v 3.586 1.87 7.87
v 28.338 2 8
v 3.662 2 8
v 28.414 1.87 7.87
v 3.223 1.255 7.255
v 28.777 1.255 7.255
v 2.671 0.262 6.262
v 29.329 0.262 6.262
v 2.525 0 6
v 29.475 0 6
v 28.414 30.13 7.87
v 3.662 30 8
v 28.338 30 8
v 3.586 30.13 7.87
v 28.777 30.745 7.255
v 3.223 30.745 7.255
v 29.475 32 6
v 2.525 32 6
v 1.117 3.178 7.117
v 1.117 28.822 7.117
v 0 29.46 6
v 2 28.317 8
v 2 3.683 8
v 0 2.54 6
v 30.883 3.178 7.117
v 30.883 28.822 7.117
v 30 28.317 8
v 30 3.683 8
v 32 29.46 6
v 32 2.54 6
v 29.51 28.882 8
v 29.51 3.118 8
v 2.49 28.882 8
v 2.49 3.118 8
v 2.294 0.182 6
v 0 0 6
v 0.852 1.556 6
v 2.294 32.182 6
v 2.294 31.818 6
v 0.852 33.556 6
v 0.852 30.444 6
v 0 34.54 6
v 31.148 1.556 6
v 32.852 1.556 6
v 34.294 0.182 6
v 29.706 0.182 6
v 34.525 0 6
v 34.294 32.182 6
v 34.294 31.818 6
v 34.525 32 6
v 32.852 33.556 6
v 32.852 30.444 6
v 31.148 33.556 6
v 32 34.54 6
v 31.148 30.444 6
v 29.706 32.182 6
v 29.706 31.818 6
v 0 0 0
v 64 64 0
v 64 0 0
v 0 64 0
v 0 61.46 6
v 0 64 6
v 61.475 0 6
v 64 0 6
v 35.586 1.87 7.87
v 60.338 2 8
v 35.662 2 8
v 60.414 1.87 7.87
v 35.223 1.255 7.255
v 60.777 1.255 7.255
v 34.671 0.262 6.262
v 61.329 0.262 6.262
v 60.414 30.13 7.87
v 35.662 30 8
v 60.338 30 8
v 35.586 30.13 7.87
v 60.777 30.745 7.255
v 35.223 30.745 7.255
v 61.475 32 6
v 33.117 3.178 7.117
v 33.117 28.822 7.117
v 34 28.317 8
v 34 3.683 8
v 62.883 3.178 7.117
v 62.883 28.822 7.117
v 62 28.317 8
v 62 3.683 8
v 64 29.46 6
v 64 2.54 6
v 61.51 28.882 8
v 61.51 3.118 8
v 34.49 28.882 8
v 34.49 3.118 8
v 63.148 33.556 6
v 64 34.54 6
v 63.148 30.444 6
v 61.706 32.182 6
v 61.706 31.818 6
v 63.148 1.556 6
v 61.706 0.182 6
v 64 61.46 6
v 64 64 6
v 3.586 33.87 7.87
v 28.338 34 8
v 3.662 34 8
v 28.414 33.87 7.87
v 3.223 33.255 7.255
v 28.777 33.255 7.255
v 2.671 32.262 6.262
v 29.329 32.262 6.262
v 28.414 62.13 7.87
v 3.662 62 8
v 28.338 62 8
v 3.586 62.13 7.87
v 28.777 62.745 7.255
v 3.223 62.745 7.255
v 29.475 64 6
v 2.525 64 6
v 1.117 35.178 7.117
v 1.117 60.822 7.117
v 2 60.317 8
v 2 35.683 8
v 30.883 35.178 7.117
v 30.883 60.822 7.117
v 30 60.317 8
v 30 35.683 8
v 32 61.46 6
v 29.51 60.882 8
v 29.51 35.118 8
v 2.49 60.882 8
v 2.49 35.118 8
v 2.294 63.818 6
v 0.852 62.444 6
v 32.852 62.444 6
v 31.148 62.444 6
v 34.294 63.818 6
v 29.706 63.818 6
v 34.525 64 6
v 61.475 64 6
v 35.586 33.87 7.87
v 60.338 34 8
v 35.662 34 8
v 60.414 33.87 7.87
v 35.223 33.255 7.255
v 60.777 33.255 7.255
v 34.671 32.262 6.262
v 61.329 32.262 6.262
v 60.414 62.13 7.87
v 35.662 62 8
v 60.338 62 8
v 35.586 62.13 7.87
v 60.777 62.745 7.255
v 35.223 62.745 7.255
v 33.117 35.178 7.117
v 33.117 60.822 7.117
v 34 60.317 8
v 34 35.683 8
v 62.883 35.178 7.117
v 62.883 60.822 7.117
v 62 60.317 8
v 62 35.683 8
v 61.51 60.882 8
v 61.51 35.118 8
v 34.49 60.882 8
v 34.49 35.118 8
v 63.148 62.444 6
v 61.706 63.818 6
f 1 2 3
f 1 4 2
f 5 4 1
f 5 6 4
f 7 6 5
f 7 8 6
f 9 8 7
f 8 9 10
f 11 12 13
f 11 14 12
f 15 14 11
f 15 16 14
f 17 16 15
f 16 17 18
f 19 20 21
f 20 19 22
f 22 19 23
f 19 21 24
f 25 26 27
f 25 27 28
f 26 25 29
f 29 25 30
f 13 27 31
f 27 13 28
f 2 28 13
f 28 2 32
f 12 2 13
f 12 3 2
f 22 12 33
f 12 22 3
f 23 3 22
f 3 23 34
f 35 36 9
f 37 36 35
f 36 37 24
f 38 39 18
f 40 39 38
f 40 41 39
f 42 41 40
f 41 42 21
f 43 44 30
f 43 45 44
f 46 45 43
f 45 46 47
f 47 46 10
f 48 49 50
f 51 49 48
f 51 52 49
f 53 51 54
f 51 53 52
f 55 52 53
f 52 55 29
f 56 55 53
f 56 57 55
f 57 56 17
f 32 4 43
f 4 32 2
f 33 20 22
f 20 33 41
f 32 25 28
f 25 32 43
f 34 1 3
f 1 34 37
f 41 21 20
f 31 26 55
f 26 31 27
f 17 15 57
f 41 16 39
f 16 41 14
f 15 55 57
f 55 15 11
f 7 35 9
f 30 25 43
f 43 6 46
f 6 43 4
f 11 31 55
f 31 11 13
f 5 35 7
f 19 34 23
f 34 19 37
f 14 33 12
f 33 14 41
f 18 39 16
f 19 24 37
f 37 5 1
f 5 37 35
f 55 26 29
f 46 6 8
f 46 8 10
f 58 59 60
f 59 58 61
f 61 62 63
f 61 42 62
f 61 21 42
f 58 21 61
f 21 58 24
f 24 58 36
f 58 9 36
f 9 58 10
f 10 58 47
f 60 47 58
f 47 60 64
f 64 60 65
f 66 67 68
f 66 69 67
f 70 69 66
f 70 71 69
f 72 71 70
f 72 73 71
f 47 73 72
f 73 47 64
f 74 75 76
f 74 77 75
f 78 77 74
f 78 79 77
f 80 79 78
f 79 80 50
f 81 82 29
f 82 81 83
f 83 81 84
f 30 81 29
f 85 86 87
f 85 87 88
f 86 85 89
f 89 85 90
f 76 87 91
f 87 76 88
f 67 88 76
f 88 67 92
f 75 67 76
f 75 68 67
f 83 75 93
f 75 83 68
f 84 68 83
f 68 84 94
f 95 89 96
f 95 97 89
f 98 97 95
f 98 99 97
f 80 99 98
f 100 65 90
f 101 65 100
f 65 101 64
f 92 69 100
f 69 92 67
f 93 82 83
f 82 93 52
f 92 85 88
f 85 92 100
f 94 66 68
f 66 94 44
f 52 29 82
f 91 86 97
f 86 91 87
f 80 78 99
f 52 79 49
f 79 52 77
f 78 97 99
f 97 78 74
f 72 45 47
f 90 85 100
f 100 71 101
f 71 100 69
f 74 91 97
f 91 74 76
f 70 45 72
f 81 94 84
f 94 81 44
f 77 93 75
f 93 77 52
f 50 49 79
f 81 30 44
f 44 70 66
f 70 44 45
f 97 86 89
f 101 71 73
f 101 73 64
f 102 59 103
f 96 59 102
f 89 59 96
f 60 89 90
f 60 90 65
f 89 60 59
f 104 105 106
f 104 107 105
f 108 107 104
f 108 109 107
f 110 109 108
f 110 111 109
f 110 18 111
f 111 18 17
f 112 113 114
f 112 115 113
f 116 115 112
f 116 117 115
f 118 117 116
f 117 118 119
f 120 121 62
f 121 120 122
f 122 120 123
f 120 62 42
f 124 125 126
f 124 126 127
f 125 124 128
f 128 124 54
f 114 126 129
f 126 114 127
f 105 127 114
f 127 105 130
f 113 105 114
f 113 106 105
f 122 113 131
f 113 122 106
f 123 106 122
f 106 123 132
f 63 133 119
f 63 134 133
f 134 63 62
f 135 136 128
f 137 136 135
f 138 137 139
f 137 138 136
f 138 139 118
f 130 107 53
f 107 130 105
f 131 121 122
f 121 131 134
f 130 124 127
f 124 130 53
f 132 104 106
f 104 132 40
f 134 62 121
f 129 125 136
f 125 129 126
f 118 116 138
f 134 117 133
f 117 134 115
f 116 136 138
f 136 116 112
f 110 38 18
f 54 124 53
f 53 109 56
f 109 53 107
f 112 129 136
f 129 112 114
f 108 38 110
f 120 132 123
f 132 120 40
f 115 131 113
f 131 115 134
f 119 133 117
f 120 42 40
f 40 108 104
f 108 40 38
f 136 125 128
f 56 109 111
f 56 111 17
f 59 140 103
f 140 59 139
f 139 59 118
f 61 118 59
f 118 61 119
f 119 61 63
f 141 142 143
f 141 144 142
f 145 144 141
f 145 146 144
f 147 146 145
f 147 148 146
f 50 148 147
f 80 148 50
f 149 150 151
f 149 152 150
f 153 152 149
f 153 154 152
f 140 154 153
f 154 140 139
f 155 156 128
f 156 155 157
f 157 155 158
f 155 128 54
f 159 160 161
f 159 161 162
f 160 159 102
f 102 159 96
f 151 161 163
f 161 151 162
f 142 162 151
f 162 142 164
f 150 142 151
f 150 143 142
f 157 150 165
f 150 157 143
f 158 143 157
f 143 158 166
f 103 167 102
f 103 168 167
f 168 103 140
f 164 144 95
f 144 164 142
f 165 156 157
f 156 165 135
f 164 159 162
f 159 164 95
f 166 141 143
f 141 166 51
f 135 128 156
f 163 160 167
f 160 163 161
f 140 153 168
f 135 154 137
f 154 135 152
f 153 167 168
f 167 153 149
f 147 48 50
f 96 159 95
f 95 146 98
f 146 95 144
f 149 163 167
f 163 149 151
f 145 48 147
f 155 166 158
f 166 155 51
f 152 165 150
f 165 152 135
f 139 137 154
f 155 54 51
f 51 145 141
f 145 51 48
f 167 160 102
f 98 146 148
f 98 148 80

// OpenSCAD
// file: WylochStyleDungeonLibrary.scad
size = 32;
baseheight = 6;
topperheight = 2;
topperrounded = true;
walllength = size;
wallheight = 25 + baseheight + topperheight;
wallwidth = 6;
wallwidththin = 4;

function hypotenuse_ra(side_a, side_b) =
    sqrt(pow(side_a, 2) + pow(side_b, 2));
    
module wsdl_Base(s,bh)
{
    cube([s,s,bh]);
}

module wsdl_Topper(s,bh,th,tr)
{
    if (tr) {
        translate([0,0,bh])
            intersection() {
                difference () {
                        cube([s,s,th]);
                        union () {
                        rotate(a=45, v=[1,0,0])
                            cube([s,th*2,th*2]);
                        translate([0,s,0])
                            rotate(a=45, v=[1,0,0])
                                cube([s,th*2,th*2]);
                        rotate(a=-45, v=[0,1,0])
                            cube([th*2,s,th*2]);
                        translate([s,0,0])
                            rotate(a=-45, v=[0,1,0])
                                cube([th*2,s,th*2]);
                        }
                }
                translate([s/2,s/2,0])
                    cylinder(
                        h=th, 
                        r1=hypotenuse_ra(s/2-1.2, s/2-1.2), 
                        r2=hypotenuse_ra(s/2-th-.8, s/2-th-.8), 
                        center=false, 
                        $fa=.1);
            }    
    }
    else {
        translate([0,0,bh])
            difference() {
                cube([s,s,th]);
                union () {
                rotate(a=45, v=[1,0,0])
                    cube([s,th*2,th*2]);
                translate([0,s,0])
                    rotate(a=45, v=[1,0,0])
                        cube([s,th*2,th*2]);
                rotate(a=-45, v=[0,1,0])
                    cube([th*2,s,th*2]);
                translate([s,0,0])
                    rotate(a=-45, v=[0,1,0])
                        cube([th*2,s,th*2]);
                }
            }    
    }
}

module wsdl_Base_1x1(s,bh,th,tr) 
{
    union () {
        wsdl_Base(s,bh);
        wsdl_Topper(s,bh,th,tr);
    }
}

module wsdl_Base_1x2(s,bh,th,tr)
{
    union () {
        wsdl_Base_1x1(s,bh,th,tr);
        translate([s,0,0])
            wsdl_Base_1x1(s,bh,th,tr);
    }
}
 
module wsdl_Base_2x2(s,bh,th,tr)
{
    union () {
        wsdl_Base_1x2(s,bh,th,tr);
        translate([0,s,0])
            wsdl_Base_1x2(s,bh,th,tr);
    }
}
 
module wsdl_Base_2x4(s,bh,th,tr)
{
    union () {
        wsdl_Base_2x2(s,bh,th,tr);
        translate([s*2,0,0])
            wsdl_Base_2x2(s,bh,th,tr);
    }
}
 
module wsdl_Base_4x4(s,bh,th,tr)
{
    union () {
        wsdl_Base_2x4(s,bh,th,tr);
        translate([0,s*2,0])
            wsdl_Base_2x4(s,bh,th,tr);
    }
}
 
module wsdl_Wall_1(w,l,h)
{
    cube([w,l,h]);   
}

module wsdl_Wall_2(w,l,h)
{
    union() {
        wsdl_Wall_1(w,l,h);
        translate([0,l,0])
            wsdl_Wall_1(w,l,h);
    }
}

module wsdl_Wall_1_Left(w,l,h) 
{
    wsdl_Wall_1(w,l,h);
}

module wsdl_Wall_1_Right(w,l,h) 
{
    translate([(size)-w,0,0])
        wsdl_Wall_1(w,l,h);
}

module wsdl_Wall_1_DoubleRight(w,l,h) 
{
    translate([(size*2)-w,0,0])
        wsdl_Wall_1(w,l,h);
}

module wsdl_Wall_1_Bottom(w,l,h) 
{
rotate(a=-90)
    translate([-w,0,0])
        wsdl_Wall_1(w,l,h);

}

module wsdl_Wall_1_Top(w,l,h) 
{
rotate(a=-90)
    translate([-l,0,0])
        wsdl_Wall_1(w,l,h);

}

module wsdl_Wall_1_Center(w,l,h) 
{
    translate([(size)-w/2,0,0])
        wsdl_Wall_1(w,l,h);
}


module wsdl_Wall_2_Left(w,l,h) 
{
    wsdl_Wall_2(w,l,h);
}

module wsdl_Wall_2_Right(w,l,h) 
{
    translate([(size*2)-w,0,0])
        wsdl_Wall_2(w,l,h);
}

module wsdl_Wall_2_Bottom(w,l,h) 
{
rotate(a=-90)
    translate([-w,0,0])
        wsdl_Wall_2(w,l,h);

}

module wsdl_Wall_2_Top(w,l,h) 
{
rotate(a=-90)
    translate([-l*2,0,0])
        wsdl_Wall_2(w,l,h);

}

module wsdl_Wall_2_Center(w,l,h) 
{
    translate([(size)-w/2,0,0])
        wsdl_Wall_2(w,l,h);
}
// main file
include <WylochStyleDungeonLibrary.scad>; 

wsdl_Base_2x2(size,baseheight,topperheight,topperrounded);
